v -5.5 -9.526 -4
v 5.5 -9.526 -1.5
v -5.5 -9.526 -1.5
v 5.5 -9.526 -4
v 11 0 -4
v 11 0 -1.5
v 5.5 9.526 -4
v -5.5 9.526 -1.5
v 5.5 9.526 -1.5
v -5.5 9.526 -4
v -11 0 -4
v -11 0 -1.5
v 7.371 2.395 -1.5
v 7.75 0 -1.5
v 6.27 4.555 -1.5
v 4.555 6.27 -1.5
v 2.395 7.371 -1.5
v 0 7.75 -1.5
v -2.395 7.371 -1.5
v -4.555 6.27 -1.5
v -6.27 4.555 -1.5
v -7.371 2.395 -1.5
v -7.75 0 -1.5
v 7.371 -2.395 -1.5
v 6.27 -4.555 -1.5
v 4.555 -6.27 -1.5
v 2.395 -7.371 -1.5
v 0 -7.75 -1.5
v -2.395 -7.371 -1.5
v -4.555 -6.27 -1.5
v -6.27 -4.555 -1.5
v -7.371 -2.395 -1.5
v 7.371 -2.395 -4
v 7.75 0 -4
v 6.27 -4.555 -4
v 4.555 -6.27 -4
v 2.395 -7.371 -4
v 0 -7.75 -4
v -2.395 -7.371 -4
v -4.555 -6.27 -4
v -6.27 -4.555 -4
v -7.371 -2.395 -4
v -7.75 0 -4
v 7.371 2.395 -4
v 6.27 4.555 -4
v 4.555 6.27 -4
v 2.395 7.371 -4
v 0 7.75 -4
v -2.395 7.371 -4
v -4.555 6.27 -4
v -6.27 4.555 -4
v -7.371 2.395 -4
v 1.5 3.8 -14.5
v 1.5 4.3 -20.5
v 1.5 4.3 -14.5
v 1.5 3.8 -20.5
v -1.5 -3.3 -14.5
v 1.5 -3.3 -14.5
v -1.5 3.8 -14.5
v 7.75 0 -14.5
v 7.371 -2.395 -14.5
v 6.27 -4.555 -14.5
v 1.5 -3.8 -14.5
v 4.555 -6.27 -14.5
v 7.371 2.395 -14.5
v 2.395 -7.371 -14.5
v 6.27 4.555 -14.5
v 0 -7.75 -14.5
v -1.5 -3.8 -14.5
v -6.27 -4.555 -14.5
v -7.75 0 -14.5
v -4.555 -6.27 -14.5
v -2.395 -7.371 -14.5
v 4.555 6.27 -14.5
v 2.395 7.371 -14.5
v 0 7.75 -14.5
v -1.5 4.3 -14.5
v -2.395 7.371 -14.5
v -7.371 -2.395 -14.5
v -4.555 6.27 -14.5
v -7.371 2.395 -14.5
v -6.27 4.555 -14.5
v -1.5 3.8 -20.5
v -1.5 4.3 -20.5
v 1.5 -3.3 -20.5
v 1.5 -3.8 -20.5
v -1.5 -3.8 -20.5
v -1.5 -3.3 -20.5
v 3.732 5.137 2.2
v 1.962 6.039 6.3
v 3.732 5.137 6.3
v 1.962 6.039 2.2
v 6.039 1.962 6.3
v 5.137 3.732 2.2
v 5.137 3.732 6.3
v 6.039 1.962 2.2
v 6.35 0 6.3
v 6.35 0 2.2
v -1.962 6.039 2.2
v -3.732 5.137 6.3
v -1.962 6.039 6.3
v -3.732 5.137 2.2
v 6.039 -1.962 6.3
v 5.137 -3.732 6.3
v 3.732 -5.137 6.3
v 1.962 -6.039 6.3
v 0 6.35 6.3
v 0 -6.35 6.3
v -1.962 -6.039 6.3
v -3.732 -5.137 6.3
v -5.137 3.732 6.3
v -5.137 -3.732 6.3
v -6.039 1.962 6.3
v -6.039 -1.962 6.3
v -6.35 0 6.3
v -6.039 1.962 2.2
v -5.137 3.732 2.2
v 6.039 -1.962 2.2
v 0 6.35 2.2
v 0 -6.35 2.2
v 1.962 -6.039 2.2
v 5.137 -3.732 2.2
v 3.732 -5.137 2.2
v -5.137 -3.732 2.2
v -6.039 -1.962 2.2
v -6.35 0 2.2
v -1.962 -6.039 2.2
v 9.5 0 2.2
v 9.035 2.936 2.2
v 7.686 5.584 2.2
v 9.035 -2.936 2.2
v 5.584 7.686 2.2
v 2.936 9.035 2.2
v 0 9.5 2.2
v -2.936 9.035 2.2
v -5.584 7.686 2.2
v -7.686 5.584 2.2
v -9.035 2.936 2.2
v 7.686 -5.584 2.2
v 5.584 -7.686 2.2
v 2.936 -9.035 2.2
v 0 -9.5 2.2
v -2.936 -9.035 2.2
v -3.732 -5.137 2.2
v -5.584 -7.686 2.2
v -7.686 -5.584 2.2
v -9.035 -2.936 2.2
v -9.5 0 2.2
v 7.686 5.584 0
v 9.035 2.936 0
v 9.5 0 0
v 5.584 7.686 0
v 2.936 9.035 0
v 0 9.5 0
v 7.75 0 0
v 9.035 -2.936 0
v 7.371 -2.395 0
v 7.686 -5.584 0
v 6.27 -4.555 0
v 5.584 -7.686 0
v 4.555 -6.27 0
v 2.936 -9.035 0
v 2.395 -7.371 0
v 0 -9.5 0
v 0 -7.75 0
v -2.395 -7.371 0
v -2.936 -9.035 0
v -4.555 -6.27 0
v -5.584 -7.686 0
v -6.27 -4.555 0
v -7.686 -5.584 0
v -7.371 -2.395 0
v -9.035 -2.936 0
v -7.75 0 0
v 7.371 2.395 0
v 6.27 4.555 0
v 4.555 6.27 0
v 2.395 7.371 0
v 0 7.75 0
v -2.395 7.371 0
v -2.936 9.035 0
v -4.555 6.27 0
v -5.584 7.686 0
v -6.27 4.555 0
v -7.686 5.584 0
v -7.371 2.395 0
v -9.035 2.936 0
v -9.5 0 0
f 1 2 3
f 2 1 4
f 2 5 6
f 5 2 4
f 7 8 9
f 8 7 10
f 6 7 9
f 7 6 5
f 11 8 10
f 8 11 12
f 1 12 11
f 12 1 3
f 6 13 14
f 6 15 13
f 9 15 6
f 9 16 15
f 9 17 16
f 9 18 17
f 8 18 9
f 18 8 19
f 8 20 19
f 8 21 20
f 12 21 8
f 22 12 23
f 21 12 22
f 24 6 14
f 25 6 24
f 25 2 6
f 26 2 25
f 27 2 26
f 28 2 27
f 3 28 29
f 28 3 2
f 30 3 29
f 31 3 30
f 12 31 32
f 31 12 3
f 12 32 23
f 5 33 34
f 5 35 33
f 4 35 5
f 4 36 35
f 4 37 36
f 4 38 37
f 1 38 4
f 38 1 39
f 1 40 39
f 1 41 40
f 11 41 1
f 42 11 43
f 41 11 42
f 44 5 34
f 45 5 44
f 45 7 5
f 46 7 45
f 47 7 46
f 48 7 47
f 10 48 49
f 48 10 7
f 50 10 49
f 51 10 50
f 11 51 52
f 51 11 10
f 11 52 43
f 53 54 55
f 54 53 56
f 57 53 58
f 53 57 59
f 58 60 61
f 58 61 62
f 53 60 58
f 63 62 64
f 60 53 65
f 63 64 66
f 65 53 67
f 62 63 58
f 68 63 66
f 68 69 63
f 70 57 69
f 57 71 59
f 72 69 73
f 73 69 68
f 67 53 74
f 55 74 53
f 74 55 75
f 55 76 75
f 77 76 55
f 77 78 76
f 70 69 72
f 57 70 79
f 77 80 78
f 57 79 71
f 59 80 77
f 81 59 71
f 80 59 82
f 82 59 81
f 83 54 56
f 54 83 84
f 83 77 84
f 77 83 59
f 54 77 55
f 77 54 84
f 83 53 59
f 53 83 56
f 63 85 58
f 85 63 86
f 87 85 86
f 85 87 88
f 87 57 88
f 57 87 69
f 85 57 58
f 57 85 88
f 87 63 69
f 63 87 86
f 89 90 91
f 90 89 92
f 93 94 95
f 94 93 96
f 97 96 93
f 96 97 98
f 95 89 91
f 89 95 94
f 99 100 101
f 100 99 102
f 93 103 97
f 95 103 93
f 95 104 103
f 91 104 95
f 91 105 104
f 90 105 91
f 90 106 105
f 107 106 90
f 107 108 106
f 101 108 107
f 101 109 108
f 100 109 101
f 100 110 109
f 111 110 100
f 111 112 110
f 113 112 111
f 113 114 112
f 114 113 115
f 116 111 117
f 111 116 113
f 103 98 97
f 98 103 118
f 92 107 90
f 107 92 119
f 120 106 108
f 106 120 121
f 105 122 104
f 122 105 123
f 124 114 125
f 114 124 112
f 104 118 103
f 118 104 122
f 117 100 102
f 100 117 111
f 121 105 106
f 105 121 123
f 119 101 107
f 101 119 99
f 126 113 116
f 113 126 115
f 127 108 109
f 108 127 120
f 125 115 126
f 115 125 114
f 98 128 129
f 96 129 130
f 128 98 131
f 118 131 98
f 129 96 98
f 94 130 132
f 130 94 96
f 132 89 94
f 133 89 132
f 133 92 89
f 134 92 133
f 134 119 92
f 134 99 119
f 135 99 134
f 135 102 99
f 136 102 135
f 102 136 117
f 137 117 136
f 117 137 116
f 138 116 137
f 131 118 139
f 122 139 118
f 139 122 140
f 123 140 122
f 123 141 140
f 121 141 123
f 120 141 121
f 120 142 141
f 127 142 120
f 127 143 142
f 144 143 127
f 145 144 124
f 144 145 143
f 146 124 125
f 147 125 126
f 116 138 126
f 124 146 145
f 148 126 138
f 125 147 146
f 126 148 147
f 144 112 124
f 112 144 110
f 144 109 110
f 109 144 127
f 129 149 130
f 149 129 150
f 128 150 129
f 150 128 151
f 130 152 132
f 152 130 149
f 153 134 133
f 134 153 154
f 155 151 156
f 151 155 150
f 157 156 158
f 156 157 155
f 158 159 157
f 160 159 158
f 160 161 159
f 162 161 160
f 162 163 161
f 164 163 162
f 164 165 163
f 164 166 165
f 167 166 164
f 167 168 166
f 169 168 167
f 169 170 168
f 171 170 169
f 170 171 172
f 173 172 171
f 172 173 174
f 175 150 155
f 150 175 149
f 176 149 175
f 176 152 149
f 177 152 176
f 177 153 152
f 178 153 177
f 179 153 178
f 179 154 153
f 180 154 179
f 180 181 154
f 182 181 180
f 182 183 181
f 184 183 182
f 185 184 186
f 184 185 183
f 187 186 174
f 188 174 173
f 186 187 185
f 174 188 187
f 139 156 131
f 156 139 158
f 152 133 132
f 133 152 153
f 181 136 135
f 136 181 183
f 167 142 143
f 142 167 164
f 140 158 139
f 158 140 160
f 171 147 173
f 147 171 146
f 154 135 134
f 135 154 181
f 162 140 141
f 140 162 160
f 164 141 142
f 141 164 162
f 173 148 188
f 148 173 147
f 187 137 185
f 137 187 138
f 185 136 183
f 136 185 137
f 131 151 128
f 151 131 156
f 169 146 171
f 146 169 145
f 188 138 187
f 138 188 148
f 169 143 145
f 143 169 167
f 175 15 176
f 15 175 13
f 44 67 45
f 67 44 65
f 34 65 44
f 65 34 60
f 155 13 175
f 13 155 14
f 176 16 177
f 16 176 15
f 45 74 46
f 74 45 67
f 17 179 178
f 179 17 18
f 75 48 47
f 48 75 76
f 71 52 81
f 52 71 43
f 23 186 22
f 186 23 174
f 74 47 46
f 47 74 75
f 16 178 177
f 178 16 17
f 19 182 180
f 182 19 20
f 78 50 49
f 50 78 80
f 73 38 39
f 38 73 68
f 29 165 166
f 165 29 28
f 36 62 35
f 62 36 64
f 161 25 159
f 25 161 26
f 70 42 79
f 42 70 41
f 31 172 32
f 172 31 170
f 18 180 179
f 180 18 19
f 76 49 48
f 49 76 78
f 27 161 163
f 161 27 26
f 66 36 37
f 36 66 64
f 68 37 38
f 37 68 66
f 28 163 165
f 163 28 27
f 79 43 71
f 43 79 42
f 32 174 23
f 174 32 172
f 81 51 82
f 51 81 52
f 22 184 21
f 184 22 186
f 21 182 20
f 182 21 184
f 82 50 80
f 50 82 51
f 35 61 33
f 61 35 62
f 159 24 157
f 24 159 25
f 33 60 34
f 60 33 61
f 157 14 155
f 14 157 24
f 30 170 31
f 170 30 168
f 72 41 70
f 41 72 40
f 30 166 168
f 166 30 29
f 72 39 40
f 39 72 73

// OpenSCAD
module pushButton12mm(color="green"){
    translate([0,0,-14.5]){ //set origin
        translate([0,0,10.5]) color("white") cylinder(r=11, h=2.5, $fn=6);
        translate([-1.5,3.8,-6]) color("white") cube([3,0.5,6]);
        translate([-1.5,-3.8,-6]) color("white") cube([3,0.5,6]);
        translate([0,0,16.7]) color(color) cylinder(d=12.7,h=4.1,$fn=20);
        translate([0,0,14.5]) cylinder(d=19,h=2.2,$fn=20);
        cylinder(d=15.5,h=14.5,$fn=20);
    }
}
pushButton12mm("red");
